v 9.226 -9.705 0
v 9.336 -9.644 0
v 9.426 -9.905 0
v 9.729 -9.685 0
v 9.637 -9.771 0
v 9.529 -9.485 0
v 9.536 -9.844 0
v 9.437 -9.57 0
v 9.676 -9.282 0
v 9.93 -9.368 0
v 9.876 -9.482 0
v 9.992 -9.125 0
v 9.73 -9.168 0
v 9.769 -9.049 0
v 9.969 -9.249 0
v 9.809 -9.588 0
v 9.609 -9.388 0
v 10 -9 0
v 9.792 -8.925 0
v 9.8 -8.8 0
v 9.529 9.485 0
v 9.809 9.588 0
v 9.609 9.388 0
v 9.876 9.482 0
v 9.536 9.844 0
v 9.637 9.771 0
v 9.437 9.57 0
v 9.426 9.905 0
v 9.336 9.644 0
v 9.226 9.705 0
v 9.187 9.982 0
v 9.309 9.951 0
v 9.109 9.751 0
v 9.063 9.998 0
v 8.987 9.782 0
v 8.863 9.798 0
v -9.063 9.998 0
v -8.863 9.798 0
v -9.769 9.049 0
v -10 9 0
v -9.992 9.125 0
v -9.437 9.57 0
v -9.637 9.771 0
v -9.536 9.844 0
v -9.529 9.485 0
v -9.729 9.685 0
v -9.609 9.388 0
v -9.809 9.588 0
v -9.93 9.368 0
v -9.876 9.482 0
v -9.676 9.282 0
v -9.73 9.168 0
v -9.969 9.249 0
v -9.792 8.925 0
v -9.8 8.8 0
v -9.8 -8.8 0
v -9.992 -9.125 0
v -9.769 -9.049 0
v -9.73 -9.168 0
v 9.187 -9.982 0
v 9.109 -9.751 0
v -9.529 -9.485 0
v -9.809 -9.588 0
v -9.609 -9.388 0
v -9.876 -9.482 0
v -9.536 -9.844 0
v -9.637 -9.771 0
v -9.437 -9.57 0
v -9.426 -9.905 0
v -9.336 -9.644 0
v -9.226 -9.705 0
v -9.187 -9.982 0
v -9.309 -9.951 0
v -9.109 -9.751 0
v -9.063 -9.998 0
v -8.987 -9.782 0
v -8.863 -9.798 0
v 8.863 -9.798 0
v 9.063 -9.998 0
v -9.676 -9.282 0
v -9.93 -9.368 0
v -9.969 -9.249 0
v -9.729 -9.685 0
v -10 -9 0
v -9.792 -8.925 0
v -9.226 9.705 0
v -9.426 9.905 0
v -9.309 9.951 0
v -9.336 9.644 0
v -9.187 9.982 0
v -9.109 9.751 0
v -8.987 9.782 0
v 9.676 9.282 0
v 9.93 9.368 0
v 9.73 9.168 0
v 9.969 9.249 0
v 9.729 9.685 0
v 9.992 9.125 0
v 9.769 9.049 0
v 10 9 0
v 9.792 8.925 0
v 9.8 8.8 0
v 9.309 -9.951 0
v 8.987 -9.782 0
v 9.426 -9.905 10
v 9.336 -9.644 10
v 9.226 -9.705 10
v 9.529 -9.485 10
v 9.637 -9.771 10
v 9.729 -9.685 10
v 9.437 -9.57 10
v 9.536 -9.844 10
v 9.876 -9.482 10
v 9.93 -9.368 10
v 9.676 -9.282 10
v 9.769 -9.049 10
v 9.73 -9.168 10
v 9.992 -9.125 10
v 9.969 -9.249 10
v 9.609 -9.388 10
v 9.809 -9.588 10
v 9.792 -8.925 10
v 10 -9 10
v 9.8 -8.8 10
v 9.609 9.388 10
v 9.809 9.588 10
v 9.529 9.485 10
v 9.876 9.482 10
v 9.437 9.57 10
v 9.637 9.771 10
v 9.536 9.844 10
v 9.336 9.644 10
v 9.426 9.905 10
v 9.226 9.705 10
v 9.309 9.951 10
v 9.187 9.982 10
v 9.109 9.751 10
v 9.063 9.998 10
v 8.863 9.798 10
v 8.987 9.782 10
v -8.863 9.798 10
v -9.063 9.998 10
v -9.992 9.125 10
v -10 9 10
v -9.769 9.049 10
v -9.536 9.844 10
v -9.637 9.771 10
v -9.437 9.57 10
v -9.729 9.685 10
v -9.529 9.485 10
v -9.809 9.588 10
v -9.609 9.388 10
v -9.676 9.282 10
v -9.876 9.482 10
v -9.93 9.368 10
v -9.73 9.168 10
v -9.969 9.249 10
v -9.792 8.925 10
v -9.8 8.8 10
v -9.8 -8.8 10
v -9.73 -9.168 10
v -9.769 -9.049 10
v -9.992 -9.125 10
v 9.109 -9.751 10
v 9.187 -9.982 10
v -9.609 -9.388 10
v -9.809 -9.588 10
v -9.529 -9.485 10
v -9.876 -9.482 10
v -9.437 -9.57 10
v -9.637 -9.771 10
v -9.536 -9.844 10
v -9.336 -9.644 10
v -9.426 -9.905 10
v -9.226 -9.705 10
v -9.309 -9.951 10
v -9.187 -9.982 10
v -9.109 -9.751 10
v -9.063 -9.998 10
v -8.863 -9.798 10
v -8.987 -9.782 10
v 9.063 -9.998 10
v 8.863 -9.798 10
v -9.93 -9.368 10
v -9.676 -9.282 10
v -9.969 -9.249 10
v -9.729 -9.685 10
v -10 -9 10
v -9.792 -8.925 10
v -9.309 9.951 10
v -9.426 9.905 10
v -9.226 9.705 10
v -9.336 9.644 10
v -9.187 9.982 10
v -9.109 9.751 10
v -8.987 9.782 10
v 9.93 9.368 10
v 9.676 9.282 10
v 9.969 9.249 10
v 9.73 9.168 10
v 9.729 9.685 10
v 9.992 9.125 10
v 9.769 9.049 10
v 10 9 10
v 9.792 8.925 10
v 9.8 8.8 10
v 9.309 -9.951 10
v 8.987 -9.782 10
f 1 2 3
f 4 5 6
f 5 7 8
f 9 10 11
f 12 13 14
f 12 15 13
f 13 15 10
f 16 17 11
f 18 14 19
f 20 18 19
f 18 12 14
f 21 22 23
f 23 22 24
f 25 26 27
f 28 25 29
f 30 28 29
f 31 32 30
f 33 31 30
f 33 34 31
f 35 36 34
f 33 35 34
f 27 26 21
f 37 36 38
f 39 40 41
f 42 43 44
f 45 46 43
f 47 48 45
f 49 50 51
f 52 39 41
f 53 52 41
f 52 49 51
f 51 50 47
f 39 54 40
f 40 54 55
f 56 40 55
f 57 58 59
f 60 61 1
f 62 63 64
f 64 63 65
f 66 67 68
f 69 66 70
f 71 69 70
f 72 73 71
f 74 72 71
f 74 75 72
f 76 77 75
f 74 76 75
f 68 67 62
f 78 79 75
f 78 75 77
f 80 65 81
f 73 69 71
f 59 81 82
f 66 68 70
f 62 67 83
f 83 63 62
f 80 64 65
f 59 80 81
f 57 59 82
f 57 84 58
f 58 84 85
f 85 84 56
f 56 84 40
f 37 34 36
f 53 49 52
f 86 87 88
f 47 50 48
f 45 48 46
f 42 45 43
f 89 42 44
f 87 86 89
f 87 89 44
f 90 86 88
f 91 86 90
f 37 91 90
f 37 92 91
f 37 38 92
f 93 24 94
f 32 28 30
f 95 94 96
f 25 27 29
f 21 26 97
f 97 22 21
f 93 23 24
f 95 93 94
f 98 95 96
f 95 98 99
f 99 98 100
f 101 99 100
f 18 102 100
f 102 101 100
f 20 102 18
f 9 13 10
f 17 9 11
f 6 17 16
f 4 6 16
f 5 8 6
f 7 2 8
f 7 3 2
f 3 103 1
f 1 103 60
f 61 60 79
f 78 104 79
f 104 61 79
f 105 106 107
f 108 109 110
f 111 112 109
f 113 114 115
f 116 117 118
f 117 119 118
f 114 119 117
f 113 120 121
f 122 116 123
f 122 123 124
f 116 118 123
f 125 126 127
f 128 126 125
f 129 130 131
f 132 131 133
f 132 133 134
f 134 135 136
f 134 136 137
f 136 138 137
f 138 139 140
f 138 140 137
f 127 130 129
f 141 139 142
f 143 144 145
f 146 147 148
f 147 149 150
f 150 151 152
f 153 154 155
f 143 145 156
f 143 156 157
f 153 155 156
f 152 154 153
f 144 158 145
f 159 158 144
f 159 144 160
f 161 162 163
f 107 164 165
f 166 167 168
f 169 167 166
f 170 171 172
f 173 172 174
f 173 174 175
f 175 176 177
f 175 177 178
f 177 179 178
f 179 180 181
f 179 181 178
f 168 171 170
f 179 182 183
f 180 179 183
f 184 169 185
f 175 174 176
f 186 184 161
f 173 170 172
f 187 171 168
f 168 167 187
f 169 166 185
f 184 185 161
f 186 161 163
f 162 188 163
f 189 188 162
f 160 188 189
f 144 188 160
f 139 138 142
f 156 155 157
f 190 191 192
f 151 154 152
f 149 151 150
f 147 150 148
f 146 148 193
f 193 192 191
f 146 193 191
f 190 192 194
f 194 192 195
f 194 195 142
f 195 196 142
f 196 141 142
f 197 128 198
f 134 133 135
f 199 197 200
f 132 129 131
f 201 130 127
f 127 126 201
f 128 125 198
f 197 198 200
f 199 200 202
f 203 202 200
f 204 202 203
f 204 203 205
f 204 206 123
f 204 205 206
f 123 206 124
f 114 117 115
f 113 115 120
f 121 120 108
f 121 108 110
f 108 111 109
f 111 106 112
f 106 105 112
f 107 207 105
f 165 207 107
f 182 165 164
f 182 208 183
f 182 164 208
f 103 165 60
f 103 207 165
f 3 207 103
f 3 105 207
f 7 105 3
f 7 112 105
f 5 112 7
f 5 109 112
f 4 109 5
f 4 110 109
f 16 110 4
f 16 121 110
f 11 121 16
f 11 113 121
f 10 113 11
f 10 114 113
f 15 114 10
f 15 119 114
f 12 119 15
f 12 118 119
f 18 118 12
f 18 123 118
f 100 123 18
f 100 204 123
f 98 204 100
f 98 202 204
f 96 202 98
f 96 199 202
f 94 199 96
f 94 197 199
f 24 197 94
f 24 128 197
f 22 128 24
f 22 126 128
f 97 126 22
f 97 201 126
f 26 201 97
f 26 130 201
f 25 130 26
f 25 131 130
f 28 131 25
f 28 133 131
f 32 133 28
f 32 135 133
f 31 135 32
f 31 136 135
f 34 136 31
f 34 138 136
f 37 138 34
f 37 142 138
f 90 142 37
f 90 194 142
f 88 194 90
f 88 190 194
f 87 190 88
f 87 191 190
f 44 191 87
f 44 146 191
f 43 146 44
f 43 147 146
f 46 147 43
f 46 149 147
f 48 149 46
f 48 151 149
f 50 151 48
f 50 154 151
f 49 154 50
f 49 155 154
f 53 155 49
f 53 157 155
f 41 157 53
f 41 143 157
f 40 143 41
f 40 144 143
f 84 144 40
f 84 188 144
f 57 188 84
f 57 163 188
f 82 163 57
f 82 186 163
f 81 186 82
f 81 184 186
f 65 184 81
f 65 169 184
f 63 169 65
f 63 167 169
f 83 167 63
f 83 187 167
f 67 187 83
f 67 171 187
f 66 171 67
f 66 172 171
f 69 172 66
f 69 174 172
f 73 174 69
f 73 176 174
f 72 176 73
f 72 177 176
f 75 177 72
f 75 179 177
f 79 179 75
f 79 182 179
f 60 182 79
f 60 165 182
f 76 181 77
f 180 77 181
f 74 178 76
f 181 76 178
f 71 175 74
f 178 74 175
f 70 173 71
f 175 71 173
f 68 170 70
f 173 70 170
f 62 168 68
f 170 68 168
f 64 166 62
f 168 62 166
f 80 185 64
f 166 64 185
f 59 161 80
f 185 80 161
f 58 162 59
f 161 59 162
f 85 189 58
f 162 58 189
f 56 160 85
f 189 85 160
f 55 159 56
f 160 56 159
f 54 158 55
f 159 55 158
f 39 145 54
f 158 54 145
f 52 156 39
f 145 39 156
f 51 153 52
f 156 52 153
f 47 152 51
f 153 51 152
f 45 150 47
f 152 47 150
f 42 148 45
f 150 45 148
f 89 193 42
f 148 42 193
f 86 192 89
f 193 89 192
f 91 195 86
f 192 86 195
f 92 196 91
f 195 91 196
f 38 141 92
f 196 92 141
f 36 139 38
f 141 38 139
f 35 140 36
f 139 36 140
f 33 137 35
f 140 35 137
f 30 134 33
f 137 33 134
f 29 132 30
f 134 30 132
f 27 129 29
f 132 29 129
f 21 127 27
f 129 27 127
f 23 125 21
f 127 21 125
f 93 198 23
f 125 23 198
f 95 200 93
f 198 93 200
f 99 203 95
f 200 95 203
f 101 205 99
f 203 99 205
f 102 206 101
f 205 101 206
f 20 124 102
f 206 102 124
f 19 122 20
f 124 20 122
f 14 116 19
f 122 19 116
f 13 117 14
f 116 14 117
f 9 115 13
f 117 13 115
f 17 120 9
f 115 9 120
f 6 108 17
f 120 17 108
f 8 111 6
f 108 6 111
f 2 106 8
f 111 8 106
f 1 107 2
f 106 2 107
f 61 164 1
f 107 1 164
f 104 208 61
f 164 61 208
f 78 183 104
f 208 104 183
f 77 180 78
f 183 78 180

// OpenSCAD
// set to your nozzle size in mm
wall_thickness = .40;

// outside width of square in mm
width = 20;

// mm
height = 10;

// mm
corner_radius = 1;

/* [Hidden] */

$fn = 50;

linear_extrude(height=height)
difference() {
	minkowski()
	{
	 square([width-(corner_radius*2), width-(corner_radius*2)], center=true);
	 circle(r=corner_radius);
	}

	minkowski()
	{
	 square([width-(corner_radius*2)-wall_thickness,width-(corner_radius*2)-wall_thickness], center=true);
	 circle(r=corner_radius);
	}
}	
